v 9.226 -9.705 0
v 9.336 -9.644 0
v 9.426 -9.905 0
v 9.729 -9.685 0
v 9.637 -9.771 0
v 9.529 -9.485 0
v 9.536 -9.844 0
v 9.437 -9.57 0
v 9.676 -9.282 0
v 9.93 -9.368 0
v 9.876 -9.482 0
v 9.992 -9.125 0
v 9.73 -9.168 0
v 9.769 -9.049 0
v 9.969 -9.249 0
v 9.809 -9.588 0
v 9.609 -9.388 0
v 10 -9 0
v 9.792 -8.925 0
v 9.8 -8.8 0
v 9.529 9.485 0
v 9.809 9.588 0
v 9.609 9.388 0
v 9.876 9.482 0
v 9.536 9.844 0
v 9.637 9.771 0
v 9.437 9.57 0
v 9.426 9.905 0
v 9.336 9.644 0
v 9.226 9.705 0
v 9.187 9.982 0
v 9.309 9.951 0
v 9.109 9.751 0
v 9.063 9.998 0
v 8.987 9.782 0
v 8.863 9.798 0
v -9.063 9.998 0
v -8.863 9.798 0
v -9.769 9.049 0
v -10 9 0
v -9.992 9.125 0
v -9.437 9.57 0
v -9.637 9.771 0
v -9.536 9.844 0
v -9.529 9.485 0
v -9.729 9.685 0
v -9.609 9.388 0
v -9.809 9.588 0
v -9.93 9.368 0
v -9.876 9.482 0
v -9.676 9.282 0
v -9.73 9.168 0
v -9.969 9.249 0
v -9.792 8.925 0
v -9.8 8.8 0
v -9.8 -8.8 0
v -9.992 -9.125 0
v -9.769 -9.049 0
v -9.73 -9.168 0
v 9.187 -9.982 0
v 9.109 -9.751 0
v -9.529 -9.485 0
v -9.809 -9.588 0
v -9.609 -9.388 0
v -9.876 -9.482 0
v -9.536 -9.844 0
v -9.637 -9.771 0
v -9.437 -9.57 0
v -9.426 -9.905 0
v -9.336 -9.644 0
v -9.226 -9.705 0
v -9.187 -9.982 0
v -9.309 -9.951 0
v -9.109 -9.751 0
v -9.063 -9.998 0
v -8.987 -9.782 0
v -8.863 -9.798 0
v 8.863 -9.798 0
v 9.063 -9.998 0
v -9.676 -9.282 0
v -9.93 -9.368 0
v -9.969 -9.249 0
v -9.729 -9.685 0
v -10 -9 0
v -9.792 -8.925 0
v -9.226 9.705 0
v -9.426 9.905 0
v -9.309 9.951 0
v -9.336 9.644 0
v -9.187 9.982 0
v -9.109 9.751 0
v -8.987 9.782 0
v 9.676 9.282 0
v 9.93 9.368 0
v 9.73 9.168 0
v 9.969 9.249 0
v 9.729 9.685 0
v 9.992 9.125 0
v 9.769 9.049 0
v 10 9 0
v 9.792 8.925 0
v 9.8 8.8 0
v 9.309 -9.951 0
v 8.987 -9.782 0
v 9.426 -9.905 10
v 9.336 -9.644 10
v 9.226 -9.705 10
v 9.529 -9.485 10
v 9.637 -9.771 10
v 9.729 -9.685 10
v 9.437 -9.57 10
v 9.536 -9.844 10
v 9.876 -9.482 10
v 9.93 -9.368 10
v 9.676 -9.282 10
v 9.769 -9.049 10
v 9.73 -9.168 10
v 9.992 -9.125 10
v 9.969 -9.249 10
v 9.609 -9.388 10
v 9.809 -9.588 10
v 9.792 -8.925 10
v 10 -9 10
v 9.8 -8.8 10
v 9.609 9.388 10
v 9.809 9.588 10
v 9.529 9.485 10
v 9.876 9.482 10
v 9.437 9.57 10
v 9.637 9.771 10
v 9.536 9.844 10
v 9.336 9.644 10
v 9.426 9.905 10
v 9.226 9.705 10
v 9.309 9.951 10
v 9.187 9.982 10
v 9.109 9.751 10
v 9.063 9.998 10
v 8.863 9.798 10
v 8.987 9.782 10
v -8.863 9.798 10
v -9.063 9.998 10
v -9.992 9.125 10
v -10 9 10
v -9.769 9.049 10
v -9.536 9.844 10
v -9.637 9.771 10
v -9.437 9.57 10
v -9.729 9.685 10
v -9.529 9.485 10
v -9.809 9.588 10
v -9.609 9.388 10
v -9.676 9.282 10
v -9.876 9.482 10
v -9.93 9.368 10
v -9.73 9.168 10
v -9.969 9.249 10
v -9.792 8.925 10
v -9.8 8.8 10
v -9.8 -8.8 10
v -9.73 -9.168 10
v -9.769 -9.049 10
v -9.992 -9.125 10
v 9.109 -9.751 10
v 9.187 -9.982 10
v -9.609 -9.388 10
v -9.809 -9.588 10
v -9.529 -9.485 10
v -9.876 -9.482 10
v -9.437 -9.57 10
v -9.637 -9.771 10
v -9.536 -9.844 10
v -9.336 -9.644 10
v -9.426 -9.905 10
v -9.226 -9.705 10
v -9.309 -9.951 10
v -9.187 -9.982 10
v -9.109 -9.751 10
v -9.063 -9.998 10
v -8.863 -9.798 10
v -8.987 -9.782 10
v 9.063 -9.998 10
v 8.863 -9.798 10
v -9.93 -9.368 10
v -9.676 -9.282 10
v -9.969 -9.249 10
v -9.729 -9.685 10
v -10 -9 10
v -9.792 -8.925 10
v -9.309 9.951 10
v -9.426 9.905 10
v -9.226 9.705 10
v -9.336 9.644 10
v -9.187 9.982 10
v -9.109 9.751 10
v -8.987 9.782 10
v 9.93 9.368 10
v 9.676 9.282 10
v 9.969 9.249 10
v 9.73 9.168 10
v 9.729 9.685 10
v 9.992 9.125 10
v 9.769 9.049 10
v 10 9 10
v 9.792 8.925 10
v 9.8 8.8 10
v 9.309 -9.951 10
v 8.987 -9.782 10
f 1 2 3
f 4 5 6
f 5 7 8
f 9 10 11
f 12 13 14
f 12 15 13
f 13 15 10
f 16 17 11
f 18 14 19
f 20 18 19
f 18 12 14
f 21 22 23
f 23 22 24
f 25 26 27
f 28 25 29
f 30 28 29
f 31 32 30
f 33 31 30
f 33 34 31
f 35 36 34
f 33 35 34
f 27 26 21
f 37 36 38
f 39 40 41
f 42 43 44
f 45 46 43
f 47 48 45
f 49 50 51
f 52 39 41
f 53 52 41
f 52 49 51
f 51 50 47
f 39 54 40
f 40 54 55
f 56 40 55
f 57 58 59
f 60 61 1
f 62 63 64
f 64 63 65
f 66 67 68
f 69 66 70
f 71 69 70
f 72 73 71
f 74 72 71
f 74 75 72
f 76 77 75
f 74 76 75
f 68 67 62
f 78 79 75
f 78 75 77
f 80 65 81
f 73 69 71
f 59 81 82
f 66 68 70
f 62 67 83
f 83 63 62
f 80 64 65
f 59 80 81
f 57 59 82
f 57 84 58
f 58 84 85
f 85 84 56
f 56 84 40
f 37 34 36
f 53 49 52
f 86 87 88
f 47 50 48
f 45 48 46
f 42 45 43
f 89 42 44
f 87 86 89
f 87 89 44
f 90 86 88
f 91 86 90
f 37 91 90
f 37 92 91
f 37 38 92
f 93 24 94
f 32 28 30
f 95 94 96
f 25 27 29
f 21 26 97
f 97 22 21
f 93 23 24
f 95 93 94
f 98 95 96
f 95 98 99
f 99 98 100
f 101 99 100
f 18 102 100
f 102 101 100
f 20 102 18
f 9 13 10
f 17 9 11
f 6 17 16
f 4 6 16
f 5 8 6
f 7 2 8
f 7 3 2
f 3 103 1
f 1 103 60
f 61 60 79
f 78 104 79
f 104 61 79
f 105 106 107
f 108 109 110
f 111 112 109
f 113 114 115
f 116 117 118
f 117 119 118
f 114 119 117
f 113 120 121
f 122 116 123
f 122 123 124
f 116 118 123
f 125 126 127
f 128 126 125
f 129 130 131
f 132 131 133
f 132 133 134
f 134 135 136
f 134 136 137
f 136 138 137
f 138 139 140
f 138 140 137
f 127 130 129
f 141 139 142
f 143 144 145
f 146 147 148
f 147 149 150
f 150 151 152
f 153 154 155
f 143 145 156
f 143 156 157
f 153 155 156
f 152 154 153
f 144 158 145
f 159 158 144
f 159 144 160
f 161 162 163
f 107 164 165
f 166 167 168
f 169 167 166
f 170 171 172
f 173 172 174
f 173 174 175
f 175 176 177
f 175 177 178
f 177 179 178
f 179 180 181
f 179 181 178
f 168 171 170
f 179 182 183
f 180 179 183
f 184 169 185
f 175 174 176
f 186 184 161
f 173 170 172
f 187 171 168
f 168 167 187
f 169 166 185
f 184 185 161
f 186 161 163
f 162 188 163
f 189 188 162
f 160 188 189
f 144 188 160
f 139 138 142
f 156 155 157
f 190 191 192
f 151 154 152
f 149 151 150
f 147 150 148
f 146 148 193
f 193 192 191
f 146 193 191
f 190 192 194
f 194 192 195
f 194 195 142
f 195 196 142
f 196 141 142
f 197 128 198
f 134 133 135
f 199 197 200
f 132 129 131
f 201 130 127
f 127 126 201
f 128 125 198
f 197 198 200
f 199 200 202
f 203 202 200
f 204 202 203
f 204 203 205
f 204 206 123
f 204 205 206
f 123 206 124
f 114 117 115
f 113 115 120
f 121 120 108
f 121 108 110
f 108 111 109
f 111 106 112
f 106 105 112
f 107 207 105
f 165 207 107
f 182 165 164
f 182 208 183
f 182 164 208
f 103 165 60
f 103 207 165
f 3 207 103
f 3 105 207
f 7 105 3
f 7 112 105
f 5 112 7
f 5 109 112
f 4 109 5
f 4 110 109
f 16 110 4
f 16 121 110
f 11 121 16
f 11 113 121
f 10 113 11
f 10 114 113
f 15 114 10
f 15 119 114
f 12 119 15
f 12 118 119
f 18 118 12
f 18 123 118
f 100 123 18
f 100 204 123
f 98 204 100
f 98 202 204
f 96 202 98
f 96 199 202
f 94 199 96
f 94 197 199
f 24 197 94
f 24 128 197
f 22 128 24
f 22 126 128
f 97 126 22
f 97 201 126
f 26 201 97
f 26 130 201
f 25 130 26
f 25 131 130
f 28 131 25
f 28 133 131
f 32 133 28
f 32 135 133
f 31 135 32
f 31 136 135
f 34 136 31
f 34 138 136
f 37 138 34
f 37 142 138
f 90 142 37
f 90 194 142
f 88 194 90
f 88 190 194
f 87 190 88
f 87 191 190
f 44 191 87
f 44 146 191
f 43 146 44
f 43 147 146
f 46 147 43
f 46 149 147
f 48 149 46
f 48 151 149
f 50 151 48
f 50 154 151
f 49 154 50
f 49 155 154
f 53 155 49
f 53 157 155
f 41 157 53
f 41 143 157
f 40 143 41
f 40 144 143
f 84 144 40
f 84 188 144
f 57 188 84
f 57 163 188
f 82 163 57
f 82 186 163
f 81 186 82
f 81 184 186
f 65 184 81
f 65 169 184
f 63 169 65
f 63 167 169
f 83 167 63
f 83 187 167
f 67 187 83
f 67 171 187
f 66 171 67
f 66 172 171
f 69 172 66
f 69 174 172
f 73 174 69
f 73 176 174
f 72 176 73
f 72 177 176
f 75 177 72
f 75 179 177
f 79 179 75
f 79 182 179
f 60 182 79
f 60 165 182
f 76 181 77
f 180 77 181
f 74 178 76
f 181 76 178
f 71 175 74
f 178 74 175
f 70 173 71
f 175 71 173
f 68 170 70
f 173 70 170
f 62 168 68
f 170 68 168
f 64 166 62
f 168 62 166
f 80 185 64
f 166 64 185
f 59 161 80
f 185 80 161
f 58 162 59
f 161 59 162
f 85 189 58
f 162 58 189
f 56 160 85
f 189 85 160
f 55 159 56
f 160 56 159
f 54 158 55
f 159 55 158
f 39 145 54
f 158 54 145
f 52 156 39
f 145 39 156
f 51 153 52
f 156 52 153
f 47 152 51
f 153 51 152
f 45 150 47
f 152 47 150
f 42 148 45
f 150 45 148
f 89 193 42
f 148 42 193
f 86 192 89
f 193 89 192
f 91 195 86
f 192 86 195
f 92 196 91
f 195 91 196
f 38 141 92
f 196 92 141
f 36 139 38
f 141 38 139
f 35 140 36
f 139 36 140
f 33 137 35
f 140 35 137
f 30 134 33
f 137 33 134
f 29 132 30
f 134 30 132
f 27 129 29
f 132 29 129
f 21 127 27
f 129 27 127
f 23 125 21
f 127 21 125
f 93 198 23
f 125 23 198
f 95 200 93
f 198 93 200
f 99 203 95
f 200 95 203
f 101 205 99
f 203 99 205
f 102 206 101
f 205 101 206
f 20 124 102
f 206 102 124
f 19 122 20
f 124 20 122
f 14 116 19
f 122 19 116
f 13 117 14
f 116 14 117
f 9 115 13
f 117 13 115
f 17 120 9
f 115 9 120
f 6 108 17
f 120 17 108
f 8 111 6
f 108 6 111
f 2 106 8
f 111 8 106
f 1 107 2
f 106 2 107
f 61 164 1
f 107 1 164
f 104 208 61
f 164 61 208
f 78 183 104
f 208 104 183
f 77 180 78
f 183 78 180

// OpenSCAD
// set to your nozzle size in mm
wall_thickness = .40;

// outside width of square in mm
width = 20;

// mm
height = 10;

// mm
corner_radius = 1;

/* [Hidden] */

$fn = 50;

linear_extrude(height=height)
difference() {
	minkowski()
	{
	 square([width-(corner_radius*2), width-(corner_radius*2)], center=true);
	 circle(r=corner_radius);
	}

	minkowski()
	{
	 square([width-(corner_radius*2)-wall_thickness,width-(corner_radius*2)-wall_thickness], center=true);
	 circle(r=corner_radius);
	}
}	
